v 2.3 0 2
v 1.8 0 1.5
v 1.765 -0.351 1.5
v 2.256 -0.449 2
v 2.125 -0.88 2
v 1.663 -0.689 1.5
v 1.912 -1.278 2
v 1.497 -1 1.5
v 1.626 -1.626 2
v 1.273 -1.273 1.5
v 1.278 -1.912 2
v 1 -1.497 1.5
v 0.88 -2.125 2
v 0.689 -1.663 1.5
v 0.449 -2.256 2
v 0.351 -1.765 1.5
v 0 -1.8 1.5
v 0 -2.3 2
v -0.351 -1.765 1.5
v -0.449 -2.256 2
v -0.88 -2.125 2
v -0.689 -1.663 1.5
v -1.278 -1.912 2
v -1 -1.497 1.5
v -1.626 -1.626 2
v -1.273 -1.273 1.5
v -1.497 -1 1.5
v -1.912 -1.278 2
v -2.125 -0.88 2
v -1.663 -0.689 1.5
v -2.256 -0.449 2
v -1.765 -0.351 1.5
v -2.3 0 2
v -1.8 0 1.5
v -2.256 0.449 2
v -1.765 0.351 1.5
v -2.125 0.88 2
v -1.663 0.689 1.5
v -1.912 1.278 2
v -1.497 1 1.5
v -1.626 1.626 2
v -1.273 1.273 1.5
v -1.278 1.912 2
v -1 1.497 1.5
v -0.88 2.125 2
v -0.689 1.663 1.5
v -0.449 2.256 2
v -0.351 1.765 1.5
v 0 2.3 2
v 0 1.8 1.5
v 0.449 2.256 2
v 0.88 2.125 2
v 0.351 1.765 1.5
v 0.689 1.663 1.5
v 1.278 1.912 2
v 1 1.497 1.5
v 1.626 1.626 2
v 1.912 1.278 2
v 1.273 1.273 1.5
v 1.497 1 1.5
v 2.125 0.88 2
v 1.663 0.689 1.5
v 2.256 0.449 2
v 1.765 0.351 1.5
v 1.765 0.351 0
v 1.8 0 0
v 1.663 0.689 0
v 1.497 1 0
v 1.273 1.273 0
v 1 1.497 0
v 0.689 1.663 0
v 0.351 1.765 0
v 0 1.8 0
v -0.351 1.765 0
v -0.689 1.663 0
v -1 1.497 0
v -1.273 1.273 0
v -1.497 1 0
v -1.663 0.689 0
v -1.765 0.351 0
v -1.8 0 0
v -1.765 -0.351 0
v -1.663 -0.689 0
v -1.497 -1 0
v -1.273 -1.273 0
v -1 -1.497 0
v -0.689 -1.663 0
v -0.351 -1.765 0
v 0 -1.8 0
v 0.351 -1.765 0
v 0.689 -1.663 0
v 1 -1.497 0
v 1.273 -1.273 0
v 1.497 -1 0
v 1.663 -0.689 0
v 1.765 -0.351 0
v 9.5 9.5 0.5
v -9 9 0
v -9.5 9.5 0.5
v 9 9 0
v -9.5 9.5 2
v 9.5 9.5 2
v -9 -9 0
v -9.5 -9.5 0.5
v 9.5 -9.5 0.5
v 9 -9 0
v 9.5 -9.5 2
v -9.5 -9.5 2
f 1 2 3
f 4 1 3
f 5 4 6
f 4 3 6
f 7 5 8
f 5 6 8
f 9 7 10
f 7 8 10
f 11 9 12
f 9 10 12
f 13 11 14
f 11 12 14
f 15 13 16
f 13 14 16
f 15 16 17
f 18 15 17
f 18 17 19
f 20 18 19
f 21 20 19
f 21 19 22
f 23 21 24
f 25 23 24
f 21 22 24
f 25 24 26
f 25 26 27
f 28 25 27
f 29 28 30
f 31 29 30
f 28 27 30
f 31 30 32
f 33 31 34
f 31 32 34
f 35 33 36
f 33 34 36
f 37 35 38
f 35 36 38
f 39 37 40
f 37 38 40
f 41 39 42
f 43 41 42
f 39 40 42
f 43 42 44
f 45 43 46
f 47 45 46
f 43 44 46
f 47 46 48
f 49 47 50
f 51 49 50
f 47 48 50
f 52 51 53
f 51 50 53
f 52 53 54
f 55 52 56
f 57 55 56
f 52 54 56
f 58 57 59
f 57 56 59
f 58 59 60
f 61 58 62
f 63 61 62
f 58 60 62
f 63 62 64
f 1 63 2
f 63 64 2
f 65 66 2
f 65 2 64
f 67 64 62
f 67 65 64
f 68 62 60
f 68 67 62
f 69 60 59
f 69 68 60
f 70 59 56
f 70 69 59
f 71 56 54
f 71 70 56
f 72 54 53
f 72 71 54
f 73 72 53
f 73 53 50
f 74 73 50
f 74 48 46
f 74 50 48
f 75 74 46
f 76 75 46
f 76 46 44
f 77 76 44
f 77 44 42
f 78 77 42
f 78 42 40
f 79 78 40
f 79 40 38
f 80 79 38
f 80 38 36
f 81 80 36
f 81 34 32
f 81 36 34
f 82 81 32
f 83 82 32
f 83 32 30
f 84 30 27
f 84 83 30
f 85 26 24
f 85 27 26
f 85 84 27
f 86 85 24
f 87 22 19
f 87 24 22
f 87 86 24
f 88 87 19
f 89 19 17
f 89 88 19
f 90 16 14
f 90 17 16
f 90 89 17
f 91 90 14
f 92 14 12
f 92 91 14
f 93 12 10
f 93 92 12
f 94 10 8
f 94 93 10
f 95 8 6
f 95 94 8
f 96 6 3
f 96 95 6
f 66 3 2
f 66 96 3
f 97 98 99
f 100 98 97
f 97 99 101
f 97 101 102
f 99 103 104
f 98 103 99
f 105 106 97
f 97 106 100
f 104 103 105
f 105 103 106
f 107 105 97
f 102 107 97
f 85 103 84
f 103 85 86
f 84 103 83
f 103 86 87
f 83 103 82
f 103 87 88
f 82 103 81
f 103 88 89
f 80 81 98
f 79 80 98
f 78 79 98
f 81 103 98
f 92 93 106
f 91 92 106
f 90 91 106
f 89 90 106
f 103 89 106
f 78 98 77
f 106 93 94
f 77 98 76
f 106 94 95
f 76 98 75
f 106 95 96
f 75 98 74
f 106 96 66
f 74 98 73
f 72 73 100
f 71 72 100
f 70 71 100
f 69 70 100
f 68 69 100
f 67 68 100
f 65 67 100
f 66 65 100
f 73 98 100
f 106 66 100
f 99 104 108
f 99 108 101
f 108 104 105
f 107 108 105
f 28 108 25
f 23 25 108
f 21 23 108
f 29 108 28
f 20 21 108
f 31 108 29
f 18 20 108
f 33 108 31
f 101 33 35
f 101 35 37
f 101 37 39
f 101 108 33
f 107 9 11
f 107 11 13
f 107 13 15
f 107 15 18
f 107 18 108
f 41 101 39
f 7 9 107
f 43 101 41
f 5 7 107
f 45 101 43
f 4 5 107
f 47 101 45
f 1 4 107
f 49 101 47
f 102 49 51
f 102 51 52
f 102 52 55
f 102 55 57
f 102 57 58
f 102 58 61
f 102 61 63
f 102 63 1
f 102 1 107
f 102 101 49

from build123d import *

# Parameters (mm, degrees)
CYLINDER080_R      = 1.8
CYLINDER080_DEPTH  = 10
BOX406008008_W     = 19
BOX406008008_H     = 19
BOX406008008_DEPTH = 2
CHAMFER026_SIZE    = 0.5
CHAMFER027_SIZE    = 0.5


with BuildPart() as cylinder078:
    # Cylinder080 → Cylinder080 (new body)
    with BuildSketch(Plane.XY.offset(-4)):
        Circle(CYLINDER080_R)
    extrude(amount=CYLINDER080_DEPTH)


with BuildPart() as filler_plate:
    # Box406008008 → Box406008008 (new body)
    with BuildSketch(Plane(origin=(-9.5, -9.5, 0), x_dir=(1, 0, 0), z_dir=(0, 0, 1))):
        with Locations((9.5, 9.5)):
            Rectangle(BOX406008008_W, BOX406008008_H)
    extrude(amount=BOX406008008_DEPTH)

    # Cut173011013: cut Cylinder078
    add(cylinder078.part, mode=Mode.SUBTRACT)

    # Chamfer026
    chamfer026_edges = [filler_plate.edges().sort_by_distance(p)[0] for p in [
        (-1.8, 0, 2),
    ]]
    chamfer(chamfer026_edges, length=CHAMFER026_SIZE)

    # Chamfer027
    chamfer027_edges = [filler_plate.edges().sort_by_distance(p)[0] for p in [
        (-9.5, 0, 0),
        (0, 9.5, 0),
        (0, -9.5, 0),
        (9.5, 0, 0),
    ]]
    chamfer(chamfer027_edges, length=CHAMFER027_SIZE)


solid = filler_plate.part
